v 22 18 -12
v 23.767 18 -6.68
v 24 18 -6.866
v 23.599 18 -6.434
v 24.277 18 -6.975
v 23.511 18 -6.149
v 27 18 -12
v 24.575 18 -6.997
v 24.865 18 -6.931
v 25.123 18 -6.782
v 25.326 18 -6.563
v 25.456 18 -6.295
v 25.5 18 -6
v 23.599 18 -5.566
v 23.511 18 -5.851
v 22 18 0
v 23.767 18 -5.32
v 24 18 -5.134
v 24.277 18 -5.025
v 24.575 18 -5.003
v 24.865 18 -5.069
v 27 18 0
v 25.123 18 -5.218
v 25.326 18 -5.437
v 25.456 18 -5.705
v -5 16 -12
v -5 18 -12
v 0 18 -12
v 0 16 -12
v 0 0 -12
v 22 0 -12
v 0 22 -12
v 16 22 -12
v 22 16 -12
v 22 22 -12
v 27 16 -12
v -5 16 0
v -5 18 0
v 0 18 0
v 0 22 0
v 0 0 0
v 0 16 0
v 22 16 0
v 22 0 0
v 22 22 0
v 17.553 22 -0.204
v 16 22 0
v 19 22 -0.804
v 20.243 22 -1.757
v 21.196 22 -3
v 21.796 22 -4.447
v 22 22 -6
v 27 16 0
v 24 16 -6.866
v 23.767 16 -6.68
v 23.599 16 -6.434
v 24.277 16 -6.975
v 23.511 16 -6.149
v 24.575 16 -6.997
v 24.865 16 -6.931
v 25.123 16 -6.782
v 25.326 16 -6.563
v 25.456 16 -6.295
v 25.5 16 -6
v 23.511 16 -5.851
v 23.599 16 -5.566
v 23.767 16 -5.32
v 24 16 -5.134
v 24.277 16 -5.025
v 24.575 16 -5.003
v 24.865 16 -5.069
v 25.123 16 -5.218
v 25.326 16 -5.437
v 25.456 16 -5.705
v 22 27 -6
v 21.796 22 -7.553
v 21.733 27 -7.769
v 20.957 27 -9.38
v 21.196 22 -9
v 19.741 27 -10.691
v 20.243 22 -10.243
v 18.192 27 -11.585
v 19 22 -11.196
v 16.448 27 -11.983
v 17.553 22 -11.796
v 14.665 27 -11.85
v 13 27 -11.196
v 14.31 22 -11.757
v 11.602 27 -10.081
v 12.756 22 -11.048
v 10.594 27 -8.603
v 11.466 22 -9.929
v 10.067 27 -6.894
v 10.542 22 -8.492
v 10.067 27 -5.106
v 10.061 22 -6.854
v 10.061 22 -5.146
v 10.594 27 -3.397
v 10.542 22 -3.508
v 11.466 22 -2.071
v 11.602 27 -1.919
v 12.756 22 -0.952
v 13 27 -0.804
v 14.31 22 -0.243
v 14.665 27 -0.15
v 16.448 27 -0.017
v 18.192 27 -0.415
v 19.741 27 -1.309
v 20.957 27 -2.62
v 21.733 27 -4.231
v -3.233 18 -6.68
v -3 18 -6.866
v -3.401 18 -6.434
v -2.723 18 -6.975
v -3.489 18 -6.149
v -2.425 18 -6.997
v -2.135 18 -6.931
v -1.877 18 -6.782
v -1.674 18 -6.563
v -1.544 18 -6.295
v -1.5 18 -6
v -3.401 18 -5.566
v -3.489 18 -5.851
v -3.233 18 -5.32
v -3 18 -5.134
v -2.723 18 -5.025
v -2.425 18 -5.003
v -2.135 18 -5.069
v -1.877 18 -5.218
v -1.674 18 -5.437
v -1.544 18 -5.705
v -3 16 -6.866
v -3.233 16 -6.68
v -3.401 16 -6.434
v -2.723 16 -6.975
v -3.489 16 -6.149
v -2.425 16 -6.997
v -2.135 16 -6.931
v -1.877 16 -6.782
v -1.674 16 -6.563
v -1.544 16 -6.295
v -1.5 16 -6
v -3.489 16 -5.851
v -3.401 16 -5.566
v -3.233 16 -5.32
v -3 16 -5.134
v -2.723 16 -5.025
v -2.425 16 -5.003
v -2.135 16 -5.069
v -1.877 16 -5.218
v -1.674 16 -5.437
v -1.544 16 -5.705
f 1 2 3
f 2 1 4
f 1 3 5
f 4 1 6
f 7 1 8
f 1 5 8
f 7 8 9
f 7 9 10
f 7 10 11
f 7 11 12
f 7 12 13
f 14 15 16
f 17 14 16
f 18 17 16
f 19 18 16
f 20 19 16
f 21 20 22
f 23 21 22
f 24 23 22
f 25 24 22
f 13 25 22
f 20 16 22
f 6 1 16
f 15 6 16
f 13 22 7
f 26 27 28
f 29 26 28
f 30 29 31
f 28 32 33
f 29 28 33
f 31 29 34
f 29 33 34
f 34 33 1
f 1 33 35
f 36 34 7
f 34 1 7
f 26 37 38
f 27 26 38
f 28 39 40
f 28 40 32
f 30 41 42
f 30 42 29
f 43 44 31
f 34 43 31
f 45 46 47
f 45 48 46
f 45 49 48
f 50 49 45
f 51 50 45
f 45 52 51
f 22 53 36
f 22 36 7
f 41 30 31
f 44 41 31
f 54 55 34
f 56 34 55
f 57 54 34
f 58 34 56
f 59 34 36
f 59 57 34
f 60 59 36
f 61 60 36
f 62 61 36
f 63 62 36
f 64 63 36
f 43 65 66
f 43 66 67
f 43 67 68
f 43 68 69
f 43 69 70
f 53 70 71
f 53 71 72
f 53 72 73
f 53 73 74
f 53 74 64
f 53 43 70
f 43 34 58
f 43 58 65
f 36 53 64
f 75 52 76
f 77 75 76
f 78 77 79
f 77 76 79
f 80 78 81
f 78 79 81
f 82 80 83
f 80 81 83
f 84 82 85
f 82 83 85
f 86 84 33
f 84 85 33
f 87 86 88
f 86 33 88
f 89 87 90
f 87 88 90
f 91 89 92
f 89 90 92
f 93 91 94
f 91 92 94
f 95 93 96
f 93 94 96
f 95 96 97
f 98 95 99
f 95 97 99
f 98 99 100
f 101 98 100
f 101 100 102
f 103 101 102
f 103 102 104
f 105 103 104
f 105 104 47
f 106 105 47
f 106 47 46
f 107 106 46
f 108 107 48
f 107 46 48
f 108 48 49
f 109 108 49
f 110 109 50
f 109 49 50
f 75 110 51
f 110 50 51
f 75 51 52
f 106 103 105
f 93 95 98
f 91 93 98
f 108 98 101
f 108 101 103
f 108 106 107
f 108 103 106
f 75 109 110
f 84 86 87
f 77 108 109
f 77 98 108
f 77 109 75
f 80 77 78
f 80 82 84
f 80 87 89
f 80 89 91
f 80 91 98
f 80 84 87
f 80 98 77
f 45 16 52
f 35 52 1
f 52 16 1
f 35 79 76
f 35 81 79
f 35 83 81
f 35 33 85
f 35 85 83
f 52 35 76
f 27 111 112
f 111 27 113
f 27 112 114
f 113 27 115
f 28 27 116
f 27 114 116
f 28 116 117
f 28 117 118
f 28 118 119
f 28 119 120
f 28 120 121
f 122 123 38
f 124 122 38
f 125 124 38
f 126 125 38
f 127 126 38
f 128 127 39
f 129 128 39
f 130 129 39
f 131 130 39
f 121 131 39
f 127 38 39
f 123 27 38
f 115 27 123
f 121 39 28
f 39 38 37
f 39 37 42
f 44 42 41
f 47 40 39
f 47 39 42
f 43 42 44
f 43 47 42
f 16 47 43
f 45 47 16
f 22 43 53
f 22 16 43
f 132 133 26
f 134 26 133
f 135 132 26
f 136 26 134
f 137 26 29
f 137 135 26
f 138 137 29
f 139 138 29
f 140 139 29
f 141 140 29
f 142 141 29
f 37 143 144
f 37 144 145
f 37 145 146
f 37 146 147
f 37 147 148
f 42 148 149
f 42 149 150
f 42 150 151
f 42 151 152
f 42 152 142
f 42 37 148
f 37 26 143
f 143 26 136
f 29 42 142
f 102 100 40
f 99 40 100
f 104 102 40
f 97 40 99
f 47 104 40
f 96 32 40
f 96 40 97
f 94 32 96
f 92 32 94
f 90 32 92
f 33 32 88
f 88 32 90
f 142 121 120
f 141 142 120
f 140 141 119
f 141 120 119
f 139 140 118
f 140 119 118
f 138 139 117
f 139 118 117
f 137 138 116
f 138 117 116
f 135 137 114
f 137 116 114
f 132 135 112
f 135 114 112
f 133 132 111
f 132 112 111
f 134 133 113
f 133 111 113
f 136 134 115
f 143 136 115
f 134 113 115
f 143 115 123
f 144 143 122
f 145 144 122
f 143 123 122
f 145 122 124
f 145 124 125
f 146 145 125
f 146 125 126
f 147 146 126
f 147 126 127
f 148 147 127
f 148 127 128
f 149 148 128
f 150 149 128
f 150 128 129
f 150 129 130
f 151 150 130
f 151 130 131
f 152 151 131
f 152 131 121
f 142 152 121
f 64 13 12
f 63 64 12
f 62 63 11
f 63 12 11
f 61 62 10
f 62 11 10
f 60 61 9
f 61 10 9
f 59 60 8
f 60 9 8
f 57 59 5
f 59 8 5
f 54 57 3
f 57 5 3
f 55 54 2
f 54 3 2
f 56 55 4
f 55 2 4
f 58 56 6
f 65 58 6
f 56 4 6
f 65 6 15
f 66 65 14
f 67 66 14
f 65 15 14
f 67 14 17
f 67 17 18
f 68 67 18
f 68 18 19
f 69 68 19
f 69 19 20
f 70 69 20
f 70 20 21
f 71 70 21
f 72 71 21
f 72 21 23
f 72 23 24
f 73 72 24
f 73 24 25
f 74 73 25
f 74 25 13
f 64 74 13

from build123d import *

# Parameters (mm, degrees)
SKETCH1_W           = 22
SKETCH1_H           = 12
BOSS_EXTRUDE1_DEPTH = 22
SKETCH2_W           = 32
SKETCH2_H           = 2
BOSS_EXTRUDE2_DEPTH = 12
SKETCH3_R           = 1
CUT_EXTRUDE1_DEPTH  = 22
SKETCH5_R           = 6
BOSS_EXTRUDE3_DEPTH = 5


with BuildPart() as part:
    # Sketch1 → Boss-Extrude1 (new body)
    with BuildSketch(Plane(origin=(0, 0, 0), x_dir=(1, 0, 0), z_dir=(0, 1, 0))):
        with Locations((11, 6)):
            Rectangle(SKETCH1_W, SKETCH1_H)
    extrude(amount=BOSS_EXTRUDE1_DEPTH)

    # Sketch2 → Boss-Extrude2 (add, through all)
    with BuildSketch(Plane.XY):
        with Locations((11, 17)):
            Rectangle(SKETCH2_W, SKETCH2_H)
    extrude(amount=-BOSS_EXTRUDE2_DEPTH)

    # Sketch3 → Cut-Extrude1 (cut)
    with BuildSketch(Plane(origin=(0, 18, 0), x_dir=(1, 0, 0), z_dir=(0, 1, 0))):
        with Locations((-2.5, 6)):
            Circle(SKETCH3_R)
        with Locations((24.5, 6)):
            Circle(SKETCH3_R)
    extrude(amount=-CUT_EXTRUDE1_DEPTH, mode=Mode.SUBTRACT)

    # Sketch5 → Boss-Extrude3 (add)
    with BuildSketch(Plane(origin=(0, 22, 0), x_dir=(1, 0, 0), z_dir=(0, 1, 0))):
        with Locations((16, 6)):
            Circle(SKETCH5_R)
    extrude(amount=BOSS_EXTRUDE3_DEPTH)


solid = part.part
